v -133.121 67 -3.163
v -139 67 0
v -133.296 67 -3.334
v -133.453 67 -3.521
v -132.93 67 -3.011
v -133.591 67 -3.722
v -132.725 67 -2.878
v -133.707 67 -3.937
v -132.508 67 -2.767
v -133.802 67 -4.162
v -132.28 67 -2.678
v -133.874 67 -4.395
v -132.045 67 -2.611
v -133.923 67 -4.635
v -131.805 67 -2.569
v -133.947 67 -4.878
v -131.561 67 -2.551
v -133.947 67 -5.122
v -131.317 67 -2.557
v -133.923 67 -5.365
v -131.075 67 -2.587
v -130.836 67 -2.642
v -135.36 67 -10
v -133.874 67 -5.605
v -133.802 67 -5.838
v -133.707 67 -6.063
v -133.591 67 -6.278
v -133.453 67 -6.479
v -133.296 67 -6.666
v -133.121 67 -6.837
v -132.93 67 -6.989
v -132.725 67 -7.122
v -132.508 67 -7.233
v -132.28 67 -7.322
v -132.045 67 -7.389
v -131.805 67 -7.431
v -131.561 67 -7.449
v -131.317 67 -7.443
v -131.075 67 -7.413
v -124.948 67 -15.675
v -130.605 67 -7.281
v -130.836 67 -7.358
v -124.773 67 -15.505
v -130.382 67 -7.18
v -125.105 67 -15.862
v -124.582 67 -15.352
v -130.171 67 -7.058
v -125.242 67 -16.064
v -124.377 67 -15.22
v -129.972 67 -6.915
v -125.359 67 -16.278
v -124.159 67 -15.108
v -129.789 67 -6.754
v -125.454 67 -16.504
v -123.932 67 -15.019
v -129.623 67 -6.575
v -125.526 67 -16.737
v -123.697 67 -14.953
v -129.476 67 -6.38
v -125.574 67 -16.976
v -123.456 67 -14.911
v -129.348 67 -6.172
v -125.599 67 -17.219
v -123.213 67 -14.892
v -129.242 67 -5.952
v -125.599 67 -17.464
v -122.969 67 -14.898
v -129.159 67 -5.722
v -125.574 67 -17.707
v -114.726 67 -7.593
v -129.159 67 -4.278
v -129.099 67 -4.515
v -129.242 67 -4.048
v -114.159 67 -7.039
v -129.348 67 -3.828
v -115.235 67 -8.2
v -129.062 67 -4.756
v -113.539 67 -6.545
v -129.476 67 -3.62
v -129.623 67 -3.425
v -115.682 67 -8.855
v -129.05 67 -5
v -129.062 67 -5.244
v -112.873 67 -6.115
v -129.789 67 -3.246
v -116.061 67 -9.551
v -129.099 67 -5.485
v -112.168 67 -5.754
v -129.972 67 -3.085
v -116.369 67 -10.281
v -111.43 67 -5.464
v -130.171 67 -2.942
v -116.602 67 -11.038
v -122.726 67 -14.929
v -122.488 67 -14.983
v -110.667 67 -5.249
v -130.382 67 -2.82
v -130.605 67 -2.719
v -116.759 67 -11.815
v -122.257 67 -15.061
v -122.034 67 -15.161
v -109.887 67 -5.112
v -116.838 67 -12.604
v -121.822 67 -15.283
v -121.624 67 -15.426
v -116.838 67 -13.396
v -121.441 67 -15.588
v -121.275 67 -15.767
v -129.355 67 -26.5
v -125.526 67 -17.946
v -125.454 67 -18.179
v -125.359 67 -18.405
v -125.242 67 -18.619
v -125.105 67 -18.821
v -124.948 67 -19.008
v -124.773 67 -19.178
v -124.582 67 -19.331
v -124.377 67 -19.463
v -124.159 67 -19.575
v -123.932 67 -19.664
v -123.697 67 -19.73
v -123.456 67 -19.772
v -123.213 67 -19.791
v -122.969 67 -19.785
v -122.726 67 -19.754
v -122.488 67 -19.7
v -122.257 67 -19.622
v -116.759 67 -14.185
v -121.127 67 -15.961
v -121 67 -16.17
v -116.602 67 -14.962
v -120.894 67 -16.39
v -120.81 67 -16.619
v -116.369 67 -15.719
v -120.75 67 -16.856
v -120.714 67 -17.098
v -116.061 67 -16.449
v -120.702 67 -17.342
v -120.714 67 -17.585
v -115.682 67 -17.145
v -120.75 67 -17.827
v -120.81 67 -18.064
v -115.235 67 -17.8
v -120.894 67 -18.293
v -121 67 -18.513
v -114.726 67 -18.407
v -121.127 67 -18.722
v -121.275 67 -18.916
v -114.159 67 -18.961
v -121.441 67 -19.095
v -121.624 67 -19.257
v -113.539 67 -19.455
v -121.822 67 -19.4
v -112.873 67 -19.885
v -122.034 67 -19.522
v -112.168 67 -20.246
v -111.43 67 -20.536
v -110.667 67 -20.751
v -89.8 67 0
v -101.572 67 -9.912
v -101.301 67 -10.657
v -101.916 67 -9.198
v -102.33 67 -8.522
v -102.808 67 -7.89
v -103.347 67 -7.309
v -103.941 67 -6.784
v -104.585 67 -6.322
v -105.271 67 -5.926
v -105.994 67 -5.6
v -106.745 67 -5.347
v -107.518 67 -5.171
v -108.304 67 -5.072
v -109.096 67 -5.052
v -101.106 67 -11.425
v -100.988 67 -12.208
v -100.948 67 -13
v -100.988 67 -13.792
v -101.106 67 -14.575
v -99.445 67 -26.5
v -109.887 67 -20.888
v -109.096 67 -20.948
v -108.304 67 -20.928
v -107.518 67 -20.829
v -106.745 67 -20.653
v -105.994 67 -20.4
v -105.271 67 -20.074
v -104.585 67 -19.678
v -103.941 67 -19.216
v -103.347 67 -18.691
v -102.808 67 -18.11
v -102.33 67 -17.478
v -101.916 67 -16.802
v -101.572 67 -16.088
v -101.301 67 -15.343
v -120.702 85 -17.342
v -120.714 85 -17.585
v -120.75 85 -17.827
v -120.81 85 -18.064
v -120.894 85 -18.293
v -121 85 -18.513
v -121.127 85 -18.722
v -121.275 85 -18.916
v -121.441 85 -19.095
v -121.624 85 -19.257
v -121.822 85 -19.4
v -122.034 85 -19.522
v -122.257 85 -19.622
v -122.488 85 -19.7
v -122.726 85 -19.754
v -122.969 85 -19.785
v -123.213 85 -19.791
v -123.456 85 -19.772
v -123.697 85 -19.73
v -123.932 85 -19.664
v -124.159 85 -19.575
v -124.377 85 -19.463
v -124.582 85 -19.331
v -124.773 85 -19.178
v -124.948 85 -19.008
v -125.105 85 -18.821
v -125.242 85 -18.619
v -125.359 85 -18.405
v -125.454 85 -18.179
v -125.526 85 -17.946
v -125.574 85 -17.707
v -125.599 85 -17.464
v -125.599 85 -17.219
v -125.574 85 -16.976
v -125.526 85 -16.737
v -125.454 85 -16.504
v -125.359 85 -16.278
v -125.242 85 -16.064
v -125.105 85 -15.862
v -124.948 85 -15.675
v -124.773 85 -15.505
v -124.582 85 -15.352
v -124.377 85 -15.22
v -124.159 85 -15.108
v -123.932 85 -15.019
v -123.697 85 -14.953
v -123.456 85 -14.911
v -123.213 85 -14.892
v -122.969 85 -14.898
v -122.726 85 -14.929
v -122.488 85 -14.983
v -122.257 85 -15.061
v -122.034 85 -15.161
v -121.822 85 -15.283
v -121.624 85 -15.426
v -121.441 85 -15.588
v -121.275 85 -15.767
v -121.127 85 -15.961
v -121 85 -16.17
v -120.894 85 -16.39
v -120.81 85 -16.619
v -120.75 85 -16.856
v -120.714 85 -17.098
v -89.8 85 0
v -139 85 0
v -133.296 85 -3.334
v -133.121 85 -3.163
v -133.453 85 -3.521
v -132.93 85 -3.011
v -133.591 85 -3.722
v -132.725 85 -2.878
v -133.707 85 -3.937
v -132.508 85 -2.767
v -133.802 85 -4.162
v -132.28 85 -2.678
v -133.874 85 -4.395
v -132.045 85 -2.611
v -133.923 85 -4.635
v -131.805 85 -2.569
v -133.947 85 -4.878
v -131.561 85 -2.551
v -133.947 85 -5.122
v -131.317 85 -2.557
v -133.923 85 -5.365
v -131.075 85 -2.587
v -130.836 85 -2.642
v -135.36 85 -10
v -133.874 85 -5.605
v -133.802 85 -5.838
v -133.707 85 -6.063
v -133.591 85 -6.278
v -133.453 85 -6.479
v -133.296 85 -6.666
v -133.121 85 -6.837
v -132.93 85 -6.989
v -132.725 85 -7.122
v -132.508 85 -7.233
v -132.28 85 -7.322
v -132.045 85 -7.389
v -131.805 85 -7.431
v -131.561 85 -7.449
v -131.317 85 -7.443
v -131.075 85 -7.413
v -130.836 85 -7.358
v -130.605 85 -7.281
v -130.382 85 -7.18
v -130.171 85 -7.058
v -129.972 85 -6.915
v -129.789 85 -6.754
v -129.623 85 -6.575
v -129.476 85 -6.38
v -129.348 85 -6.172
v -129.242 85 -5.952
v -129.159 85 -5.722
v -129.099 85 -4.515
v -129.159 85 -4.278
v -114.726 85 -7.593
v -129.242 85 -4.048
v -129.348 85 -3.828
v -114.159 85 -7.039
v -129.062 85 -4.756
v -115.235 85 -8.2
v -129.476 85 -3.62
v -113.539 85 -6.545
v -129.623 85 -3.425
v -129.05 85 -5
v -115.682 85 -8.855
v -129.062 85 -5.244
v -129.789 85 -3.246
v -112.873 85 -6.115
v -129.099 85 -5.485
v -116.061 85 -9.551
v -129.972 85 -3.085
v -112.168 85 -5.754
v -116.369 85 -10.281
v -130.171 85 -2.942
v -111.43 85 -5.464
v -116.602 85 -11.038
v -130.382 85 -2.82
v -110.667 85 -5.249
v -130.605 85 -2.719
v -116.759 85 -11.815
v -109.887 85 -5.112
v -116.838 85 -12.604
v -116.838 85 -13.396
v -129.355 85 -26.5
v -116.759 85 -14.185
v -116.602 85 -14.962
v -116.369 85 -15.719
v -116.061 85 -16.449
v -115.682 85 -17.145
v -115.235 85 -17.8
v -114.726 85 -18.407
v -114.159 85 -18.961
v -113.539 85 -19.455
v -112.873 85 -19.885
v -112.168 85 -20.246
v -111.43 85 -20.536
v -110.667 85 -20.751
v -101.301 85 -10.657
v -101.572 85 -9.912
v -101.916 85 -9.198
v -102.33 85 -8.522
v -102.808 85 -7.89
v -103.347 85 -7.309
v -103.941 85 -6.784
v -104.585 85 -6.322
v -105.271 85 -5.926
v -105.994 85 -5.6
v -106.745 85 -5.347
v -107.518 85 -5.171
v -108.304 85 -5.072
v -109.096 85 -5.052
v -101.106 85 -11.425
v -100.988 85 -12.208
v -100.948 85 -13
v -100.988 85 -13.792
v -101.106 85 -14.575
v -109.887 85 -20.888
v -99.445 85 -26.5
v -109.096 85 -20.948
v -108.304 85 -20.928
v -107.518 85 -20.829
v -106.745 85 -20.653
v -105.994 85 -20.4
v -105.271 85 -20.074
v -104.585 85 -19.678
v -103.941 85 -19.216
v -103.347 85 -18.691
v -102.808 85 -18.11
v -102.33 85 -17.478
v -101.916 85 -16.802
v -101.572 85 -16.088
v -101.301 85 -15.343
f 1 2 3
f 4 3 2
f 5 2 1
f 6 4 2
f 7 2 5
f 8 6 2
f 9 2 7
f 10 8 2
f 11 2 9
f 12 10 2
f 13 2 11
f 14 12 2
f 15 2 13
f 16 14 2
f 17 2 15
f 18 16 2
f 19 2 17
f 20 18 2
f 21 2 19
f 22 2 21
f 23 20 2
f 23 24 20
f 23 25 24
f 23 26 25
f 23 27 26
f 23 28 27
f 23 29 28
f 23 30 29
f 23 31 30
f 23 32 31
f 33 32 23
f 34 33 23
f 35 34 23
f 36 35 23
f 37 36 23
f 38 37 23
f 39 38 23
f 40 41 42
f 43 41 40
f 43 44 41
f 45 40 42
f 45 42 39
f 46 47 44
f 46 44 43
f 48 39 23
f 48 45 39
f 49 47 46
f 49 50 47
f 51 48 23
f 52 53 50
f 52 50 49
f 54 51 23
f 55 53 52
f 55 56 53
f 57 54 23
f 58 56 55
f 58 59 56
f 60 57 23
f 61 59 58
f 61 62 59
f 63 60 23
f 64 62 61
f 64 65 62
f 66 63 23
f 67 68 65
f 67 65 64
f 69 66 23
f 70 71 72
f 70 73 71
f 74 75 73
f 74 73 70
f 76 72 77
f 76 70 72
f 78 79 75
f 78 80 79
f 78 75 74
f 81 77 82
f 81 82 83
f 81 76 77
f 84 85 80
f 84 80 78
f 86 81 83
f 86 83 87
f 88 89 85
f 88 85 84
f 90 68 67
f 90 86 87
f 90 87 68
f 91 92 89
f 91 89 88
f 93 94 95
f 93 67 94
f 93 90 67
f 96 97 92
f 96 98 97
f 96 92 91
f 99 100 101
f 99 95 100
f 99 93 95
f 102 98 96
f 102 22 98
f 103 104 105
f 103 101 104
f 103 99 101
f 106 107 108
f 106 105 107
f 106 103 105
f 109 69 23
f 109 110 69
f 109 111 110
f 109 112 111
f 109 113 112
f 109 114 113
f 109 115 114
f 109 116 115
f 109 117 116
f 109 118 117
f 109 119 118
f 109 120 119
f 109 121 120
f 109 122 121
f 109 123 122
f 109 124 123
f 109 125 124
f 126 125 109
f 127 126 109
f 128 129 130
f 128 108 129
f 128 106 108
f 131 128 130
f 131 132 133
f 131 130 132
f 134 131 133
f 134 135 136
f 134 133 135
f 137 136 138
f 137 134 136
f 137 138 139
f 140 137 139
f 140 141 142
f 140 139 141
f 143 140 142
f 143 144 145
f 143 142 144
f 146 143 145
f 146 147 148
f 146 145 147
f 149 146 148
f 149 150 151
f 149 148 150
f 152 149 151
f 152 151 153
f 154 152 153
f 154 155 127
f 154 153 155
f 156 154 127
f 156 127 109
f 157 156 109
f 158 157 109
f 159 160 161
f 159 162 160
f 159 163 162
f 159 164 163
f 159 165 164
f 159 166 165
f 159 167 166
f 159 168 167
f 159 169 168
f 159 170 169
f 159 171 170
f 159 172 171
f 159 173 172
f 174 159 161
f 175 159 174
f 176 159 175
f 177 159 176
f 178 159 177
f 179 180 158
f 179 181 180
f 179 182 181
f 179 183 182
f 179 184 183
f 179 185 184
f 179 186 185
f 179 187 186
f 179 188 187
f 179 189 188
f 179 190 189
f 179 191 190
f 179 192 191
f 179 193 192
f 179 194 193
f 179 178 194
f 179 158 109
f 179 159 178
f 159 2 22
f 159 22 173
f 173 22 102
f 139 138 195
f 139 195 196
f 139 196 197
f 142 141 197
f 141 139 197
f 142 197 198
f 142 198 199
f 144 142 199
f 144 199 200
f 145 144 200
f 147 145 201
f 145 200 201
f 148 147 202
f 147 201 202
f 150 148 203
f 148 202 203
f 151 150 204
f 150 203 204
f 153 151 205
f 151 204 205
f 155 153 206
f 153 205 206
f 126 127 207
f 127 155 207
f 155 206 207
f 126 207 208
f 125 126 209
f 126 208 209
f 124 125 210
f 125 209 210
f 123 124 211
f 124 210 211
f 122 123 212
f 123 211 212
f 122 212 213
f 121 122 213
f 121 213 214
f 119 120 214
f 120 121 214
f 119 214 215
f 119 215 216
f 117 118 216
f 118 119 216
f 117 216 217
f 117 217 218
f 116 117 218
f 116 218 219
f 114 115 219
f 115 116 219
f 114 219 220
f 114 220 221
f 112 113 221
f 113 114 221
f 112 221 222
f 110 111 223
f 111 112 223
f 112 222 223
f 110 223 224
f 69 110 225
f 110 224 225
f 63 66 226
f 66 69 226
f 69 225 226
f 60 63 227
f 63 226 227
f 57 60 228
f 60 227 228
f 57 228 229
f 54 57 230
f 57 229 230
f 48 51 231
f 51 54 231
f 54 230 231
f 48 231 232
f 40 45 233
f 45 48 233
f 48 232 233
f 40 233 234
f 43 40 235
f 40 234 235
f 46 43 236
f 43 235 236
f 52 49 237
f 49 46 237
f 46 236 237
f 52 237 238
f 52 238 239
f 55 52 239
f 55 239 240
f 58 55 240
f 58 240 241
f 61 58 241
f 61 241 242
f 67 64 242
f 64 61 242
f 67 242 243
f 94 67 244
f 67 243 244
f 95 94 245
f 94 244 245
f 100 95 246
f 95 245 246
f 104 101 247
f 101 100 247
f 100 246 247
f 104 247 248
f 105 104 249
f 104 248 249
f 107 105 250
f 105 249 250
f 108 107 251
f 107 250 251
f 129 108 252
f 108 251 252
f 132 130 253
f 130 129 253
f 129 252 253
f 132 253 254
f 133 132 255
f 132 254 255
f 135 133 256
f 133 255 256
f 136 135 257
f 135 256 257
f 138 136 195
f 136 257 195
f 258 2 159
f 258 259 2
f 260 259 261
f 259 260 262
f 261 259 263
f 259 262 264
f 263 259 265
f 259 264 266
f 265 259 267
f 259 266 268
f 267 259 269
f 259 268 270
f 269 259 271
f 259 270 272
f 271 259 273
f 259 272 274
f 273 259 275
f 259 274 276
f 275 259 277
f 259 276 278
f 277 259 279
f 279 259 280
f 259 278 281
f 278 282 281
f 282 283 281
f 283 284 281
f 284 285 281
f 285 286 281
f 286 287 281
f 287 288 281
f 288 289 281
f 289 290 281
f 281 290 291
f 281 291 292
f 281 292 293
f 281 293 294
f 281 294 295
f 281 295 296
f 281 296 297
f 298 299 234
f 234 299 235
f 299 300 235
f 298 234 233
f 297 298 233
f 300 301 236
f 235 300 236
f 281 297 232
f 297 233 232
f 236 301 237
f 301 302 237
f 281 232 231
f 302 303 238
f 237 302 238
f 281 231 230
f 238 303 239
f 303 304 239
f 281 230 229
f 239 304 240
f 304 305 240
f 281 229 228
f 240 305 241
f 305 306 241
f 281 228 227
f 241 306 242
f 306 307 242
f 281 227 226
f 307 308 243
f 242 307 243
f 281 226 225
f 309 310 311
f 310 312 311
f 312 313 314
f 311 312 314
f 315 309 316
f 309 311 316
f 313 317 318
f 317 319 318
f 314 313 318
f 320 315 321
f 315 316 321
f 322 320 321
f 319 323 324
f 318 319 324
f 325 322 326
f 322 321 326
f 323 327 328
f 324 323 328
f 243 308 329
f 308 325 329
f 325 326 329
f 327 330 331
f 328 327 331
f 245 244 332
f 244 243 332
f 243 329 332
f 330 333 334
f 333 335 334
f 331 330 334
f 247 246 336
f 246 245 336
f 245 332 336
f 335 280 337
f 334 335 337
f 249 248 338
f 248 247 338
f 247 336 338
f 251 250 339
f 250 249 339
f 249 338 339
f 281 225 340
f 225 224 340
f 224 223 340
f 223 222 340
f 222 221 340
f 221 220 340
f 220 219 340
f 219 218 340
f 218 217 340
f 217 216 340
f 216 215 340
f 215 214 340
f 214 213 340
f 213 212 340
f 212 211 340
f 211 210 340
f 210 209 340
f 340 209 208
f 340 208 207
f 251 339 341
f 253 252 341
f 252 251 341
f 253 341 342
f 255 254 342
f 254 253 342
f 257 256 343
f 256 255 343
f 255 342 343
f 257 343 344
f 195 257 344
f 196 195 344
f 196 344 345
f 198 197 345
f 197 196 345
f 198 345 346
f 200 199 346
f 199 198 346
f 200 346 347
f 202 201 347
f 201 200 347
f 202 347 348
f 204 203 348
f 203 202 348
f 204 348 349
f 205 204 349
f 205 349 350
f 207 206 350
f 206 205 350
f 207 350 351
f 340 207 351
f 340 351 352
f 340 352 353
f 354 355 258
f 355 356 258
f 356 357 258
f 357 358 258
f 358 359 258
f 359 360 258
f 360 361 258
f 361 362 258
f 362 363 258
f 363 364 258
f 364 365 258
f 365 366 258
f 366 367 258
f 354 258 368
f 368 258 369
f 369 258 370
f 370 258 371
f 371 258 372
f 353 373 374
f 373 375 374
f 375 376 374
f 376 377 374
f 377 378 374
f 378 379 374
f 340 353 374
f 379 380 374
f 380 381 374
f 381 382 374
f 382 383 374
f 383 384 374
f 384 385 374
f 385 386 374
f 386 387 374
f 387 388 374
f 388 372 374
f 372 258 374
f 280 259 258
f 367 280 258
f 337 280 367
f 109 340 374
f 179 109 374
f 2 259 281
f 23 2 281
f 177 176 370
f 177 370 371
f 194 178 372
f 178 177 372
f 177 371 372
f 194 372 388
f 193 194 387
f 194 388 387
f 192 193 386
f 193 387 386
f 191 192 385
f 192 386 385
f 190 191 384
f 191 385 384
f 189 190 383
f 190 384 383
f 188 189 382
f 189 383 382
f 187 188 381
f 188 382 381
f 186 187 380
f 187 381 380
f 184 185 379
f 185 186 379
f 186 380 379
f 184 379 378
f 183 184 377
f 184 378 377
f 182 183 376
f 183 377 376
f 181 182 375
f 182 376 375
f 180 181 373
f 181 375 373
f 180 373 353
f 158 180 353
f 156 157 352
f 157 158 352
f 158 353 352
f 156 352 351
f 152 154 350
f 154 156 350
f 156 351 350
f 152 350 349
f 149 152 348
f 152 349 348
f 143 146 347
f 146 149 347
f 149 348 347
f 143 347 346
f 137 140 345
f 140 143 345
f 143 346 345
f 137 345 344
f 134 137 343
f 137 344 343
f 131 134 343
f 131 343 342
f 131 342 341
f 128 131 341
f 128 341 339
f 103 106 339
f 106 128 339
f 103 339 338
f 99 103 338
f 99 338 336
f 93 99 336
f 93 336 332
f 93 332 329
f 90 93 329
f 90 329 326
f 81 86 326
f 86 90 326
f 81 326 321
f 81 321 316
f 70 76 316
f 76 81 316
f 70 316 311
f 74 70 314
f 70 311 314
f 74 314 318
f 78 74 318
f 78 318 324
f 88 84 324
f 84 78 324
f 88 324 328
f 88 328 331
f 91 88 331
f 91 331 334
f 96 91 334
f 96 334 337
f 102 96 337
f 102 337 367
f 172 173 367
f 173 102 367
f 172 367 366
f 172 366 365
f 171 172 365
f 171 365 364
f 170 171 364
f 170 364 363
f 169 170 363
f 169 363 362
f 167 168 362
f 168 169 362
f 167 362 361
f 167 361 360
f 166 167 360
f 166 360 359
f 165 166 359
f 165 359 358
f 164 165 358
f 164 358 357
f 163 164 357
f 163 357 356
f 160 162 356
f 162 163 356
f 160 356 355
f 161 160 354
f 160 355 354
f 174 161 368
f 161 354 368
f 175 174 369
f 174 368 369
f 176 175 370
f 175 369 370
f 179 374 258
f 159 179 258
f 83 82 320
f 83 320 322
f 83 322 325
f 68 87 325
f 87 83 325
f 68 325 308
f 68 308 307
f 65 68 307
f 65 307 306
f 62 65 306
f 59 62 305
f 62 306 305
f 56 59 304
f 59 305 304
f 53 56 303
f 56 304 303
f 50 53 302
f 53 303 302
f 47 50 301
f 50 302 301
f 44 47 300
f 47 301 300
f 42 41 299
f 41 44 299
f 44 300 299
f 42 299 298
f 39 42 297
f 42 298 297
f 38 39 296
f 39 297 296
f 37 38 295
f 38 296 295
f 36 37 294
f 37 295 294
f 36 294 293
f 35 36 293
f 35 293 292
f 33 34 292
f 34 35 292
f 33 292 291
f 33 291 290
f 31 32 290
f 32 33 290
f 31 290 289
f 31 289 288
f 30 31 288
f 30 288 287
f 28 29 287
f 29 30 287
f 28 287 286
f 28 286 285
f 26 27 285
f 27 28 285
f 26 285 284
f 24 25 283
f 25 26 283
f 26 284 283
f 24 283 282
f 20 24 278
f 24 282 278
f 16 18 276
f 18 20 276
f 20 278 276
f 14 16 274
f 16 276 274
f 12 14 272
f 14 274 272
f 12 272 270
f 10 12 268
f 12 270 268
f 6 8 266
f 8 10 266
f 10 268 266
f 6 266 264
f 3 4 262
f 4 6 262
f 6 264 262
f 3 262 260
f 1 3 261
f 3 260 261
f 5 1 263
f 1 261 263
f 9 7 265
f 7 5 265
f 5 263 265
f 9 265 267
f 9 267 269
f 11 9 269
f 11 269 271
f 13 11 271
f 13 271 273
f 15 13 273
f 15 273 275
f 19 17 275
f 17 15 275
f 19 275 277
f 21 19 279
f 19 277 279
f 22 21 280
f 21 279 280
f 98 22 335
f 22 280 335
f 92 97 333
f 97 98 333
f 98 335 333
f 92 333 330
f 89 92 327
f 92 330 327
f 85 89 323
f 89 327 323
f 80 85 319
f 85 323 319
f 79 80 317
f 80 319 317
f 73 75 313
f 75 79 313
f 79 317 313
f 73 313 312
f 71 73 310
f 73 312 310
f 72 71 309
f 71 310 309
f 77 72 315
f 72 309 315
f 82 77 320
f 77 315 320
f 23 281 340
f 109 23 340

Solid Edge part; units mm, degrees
sketch "Sketch1" plane through (0, 85, 0) normal (0, -1, 0) x (1, 0, 0)
  line L0 (-135.3603, -10) -> (-129.3548, -26.5)
  line L1 (-129.3548, -26.5) -> (-99.4453, -26.5)
  line L2 (-99.4453, -26.5) -> (-89.8001, 0)
  line L3 (-139, 0) -> (-89.8001, 0)
  line L4 (-139, 0) -> (-135.3603, -10)
  circle A0 centre (-123.1516, -17.3415) radius 2.45
  circle A1 centre (-131.5, -5) radius 2.45
  circle A2 centre (-108.8981, -13) radius 7.95
  dimension "D1" = 13.5
extrude "Extrusionsausprägung_1" add sketch "Sketch1" along normal blind 18
properties material "(None)"
